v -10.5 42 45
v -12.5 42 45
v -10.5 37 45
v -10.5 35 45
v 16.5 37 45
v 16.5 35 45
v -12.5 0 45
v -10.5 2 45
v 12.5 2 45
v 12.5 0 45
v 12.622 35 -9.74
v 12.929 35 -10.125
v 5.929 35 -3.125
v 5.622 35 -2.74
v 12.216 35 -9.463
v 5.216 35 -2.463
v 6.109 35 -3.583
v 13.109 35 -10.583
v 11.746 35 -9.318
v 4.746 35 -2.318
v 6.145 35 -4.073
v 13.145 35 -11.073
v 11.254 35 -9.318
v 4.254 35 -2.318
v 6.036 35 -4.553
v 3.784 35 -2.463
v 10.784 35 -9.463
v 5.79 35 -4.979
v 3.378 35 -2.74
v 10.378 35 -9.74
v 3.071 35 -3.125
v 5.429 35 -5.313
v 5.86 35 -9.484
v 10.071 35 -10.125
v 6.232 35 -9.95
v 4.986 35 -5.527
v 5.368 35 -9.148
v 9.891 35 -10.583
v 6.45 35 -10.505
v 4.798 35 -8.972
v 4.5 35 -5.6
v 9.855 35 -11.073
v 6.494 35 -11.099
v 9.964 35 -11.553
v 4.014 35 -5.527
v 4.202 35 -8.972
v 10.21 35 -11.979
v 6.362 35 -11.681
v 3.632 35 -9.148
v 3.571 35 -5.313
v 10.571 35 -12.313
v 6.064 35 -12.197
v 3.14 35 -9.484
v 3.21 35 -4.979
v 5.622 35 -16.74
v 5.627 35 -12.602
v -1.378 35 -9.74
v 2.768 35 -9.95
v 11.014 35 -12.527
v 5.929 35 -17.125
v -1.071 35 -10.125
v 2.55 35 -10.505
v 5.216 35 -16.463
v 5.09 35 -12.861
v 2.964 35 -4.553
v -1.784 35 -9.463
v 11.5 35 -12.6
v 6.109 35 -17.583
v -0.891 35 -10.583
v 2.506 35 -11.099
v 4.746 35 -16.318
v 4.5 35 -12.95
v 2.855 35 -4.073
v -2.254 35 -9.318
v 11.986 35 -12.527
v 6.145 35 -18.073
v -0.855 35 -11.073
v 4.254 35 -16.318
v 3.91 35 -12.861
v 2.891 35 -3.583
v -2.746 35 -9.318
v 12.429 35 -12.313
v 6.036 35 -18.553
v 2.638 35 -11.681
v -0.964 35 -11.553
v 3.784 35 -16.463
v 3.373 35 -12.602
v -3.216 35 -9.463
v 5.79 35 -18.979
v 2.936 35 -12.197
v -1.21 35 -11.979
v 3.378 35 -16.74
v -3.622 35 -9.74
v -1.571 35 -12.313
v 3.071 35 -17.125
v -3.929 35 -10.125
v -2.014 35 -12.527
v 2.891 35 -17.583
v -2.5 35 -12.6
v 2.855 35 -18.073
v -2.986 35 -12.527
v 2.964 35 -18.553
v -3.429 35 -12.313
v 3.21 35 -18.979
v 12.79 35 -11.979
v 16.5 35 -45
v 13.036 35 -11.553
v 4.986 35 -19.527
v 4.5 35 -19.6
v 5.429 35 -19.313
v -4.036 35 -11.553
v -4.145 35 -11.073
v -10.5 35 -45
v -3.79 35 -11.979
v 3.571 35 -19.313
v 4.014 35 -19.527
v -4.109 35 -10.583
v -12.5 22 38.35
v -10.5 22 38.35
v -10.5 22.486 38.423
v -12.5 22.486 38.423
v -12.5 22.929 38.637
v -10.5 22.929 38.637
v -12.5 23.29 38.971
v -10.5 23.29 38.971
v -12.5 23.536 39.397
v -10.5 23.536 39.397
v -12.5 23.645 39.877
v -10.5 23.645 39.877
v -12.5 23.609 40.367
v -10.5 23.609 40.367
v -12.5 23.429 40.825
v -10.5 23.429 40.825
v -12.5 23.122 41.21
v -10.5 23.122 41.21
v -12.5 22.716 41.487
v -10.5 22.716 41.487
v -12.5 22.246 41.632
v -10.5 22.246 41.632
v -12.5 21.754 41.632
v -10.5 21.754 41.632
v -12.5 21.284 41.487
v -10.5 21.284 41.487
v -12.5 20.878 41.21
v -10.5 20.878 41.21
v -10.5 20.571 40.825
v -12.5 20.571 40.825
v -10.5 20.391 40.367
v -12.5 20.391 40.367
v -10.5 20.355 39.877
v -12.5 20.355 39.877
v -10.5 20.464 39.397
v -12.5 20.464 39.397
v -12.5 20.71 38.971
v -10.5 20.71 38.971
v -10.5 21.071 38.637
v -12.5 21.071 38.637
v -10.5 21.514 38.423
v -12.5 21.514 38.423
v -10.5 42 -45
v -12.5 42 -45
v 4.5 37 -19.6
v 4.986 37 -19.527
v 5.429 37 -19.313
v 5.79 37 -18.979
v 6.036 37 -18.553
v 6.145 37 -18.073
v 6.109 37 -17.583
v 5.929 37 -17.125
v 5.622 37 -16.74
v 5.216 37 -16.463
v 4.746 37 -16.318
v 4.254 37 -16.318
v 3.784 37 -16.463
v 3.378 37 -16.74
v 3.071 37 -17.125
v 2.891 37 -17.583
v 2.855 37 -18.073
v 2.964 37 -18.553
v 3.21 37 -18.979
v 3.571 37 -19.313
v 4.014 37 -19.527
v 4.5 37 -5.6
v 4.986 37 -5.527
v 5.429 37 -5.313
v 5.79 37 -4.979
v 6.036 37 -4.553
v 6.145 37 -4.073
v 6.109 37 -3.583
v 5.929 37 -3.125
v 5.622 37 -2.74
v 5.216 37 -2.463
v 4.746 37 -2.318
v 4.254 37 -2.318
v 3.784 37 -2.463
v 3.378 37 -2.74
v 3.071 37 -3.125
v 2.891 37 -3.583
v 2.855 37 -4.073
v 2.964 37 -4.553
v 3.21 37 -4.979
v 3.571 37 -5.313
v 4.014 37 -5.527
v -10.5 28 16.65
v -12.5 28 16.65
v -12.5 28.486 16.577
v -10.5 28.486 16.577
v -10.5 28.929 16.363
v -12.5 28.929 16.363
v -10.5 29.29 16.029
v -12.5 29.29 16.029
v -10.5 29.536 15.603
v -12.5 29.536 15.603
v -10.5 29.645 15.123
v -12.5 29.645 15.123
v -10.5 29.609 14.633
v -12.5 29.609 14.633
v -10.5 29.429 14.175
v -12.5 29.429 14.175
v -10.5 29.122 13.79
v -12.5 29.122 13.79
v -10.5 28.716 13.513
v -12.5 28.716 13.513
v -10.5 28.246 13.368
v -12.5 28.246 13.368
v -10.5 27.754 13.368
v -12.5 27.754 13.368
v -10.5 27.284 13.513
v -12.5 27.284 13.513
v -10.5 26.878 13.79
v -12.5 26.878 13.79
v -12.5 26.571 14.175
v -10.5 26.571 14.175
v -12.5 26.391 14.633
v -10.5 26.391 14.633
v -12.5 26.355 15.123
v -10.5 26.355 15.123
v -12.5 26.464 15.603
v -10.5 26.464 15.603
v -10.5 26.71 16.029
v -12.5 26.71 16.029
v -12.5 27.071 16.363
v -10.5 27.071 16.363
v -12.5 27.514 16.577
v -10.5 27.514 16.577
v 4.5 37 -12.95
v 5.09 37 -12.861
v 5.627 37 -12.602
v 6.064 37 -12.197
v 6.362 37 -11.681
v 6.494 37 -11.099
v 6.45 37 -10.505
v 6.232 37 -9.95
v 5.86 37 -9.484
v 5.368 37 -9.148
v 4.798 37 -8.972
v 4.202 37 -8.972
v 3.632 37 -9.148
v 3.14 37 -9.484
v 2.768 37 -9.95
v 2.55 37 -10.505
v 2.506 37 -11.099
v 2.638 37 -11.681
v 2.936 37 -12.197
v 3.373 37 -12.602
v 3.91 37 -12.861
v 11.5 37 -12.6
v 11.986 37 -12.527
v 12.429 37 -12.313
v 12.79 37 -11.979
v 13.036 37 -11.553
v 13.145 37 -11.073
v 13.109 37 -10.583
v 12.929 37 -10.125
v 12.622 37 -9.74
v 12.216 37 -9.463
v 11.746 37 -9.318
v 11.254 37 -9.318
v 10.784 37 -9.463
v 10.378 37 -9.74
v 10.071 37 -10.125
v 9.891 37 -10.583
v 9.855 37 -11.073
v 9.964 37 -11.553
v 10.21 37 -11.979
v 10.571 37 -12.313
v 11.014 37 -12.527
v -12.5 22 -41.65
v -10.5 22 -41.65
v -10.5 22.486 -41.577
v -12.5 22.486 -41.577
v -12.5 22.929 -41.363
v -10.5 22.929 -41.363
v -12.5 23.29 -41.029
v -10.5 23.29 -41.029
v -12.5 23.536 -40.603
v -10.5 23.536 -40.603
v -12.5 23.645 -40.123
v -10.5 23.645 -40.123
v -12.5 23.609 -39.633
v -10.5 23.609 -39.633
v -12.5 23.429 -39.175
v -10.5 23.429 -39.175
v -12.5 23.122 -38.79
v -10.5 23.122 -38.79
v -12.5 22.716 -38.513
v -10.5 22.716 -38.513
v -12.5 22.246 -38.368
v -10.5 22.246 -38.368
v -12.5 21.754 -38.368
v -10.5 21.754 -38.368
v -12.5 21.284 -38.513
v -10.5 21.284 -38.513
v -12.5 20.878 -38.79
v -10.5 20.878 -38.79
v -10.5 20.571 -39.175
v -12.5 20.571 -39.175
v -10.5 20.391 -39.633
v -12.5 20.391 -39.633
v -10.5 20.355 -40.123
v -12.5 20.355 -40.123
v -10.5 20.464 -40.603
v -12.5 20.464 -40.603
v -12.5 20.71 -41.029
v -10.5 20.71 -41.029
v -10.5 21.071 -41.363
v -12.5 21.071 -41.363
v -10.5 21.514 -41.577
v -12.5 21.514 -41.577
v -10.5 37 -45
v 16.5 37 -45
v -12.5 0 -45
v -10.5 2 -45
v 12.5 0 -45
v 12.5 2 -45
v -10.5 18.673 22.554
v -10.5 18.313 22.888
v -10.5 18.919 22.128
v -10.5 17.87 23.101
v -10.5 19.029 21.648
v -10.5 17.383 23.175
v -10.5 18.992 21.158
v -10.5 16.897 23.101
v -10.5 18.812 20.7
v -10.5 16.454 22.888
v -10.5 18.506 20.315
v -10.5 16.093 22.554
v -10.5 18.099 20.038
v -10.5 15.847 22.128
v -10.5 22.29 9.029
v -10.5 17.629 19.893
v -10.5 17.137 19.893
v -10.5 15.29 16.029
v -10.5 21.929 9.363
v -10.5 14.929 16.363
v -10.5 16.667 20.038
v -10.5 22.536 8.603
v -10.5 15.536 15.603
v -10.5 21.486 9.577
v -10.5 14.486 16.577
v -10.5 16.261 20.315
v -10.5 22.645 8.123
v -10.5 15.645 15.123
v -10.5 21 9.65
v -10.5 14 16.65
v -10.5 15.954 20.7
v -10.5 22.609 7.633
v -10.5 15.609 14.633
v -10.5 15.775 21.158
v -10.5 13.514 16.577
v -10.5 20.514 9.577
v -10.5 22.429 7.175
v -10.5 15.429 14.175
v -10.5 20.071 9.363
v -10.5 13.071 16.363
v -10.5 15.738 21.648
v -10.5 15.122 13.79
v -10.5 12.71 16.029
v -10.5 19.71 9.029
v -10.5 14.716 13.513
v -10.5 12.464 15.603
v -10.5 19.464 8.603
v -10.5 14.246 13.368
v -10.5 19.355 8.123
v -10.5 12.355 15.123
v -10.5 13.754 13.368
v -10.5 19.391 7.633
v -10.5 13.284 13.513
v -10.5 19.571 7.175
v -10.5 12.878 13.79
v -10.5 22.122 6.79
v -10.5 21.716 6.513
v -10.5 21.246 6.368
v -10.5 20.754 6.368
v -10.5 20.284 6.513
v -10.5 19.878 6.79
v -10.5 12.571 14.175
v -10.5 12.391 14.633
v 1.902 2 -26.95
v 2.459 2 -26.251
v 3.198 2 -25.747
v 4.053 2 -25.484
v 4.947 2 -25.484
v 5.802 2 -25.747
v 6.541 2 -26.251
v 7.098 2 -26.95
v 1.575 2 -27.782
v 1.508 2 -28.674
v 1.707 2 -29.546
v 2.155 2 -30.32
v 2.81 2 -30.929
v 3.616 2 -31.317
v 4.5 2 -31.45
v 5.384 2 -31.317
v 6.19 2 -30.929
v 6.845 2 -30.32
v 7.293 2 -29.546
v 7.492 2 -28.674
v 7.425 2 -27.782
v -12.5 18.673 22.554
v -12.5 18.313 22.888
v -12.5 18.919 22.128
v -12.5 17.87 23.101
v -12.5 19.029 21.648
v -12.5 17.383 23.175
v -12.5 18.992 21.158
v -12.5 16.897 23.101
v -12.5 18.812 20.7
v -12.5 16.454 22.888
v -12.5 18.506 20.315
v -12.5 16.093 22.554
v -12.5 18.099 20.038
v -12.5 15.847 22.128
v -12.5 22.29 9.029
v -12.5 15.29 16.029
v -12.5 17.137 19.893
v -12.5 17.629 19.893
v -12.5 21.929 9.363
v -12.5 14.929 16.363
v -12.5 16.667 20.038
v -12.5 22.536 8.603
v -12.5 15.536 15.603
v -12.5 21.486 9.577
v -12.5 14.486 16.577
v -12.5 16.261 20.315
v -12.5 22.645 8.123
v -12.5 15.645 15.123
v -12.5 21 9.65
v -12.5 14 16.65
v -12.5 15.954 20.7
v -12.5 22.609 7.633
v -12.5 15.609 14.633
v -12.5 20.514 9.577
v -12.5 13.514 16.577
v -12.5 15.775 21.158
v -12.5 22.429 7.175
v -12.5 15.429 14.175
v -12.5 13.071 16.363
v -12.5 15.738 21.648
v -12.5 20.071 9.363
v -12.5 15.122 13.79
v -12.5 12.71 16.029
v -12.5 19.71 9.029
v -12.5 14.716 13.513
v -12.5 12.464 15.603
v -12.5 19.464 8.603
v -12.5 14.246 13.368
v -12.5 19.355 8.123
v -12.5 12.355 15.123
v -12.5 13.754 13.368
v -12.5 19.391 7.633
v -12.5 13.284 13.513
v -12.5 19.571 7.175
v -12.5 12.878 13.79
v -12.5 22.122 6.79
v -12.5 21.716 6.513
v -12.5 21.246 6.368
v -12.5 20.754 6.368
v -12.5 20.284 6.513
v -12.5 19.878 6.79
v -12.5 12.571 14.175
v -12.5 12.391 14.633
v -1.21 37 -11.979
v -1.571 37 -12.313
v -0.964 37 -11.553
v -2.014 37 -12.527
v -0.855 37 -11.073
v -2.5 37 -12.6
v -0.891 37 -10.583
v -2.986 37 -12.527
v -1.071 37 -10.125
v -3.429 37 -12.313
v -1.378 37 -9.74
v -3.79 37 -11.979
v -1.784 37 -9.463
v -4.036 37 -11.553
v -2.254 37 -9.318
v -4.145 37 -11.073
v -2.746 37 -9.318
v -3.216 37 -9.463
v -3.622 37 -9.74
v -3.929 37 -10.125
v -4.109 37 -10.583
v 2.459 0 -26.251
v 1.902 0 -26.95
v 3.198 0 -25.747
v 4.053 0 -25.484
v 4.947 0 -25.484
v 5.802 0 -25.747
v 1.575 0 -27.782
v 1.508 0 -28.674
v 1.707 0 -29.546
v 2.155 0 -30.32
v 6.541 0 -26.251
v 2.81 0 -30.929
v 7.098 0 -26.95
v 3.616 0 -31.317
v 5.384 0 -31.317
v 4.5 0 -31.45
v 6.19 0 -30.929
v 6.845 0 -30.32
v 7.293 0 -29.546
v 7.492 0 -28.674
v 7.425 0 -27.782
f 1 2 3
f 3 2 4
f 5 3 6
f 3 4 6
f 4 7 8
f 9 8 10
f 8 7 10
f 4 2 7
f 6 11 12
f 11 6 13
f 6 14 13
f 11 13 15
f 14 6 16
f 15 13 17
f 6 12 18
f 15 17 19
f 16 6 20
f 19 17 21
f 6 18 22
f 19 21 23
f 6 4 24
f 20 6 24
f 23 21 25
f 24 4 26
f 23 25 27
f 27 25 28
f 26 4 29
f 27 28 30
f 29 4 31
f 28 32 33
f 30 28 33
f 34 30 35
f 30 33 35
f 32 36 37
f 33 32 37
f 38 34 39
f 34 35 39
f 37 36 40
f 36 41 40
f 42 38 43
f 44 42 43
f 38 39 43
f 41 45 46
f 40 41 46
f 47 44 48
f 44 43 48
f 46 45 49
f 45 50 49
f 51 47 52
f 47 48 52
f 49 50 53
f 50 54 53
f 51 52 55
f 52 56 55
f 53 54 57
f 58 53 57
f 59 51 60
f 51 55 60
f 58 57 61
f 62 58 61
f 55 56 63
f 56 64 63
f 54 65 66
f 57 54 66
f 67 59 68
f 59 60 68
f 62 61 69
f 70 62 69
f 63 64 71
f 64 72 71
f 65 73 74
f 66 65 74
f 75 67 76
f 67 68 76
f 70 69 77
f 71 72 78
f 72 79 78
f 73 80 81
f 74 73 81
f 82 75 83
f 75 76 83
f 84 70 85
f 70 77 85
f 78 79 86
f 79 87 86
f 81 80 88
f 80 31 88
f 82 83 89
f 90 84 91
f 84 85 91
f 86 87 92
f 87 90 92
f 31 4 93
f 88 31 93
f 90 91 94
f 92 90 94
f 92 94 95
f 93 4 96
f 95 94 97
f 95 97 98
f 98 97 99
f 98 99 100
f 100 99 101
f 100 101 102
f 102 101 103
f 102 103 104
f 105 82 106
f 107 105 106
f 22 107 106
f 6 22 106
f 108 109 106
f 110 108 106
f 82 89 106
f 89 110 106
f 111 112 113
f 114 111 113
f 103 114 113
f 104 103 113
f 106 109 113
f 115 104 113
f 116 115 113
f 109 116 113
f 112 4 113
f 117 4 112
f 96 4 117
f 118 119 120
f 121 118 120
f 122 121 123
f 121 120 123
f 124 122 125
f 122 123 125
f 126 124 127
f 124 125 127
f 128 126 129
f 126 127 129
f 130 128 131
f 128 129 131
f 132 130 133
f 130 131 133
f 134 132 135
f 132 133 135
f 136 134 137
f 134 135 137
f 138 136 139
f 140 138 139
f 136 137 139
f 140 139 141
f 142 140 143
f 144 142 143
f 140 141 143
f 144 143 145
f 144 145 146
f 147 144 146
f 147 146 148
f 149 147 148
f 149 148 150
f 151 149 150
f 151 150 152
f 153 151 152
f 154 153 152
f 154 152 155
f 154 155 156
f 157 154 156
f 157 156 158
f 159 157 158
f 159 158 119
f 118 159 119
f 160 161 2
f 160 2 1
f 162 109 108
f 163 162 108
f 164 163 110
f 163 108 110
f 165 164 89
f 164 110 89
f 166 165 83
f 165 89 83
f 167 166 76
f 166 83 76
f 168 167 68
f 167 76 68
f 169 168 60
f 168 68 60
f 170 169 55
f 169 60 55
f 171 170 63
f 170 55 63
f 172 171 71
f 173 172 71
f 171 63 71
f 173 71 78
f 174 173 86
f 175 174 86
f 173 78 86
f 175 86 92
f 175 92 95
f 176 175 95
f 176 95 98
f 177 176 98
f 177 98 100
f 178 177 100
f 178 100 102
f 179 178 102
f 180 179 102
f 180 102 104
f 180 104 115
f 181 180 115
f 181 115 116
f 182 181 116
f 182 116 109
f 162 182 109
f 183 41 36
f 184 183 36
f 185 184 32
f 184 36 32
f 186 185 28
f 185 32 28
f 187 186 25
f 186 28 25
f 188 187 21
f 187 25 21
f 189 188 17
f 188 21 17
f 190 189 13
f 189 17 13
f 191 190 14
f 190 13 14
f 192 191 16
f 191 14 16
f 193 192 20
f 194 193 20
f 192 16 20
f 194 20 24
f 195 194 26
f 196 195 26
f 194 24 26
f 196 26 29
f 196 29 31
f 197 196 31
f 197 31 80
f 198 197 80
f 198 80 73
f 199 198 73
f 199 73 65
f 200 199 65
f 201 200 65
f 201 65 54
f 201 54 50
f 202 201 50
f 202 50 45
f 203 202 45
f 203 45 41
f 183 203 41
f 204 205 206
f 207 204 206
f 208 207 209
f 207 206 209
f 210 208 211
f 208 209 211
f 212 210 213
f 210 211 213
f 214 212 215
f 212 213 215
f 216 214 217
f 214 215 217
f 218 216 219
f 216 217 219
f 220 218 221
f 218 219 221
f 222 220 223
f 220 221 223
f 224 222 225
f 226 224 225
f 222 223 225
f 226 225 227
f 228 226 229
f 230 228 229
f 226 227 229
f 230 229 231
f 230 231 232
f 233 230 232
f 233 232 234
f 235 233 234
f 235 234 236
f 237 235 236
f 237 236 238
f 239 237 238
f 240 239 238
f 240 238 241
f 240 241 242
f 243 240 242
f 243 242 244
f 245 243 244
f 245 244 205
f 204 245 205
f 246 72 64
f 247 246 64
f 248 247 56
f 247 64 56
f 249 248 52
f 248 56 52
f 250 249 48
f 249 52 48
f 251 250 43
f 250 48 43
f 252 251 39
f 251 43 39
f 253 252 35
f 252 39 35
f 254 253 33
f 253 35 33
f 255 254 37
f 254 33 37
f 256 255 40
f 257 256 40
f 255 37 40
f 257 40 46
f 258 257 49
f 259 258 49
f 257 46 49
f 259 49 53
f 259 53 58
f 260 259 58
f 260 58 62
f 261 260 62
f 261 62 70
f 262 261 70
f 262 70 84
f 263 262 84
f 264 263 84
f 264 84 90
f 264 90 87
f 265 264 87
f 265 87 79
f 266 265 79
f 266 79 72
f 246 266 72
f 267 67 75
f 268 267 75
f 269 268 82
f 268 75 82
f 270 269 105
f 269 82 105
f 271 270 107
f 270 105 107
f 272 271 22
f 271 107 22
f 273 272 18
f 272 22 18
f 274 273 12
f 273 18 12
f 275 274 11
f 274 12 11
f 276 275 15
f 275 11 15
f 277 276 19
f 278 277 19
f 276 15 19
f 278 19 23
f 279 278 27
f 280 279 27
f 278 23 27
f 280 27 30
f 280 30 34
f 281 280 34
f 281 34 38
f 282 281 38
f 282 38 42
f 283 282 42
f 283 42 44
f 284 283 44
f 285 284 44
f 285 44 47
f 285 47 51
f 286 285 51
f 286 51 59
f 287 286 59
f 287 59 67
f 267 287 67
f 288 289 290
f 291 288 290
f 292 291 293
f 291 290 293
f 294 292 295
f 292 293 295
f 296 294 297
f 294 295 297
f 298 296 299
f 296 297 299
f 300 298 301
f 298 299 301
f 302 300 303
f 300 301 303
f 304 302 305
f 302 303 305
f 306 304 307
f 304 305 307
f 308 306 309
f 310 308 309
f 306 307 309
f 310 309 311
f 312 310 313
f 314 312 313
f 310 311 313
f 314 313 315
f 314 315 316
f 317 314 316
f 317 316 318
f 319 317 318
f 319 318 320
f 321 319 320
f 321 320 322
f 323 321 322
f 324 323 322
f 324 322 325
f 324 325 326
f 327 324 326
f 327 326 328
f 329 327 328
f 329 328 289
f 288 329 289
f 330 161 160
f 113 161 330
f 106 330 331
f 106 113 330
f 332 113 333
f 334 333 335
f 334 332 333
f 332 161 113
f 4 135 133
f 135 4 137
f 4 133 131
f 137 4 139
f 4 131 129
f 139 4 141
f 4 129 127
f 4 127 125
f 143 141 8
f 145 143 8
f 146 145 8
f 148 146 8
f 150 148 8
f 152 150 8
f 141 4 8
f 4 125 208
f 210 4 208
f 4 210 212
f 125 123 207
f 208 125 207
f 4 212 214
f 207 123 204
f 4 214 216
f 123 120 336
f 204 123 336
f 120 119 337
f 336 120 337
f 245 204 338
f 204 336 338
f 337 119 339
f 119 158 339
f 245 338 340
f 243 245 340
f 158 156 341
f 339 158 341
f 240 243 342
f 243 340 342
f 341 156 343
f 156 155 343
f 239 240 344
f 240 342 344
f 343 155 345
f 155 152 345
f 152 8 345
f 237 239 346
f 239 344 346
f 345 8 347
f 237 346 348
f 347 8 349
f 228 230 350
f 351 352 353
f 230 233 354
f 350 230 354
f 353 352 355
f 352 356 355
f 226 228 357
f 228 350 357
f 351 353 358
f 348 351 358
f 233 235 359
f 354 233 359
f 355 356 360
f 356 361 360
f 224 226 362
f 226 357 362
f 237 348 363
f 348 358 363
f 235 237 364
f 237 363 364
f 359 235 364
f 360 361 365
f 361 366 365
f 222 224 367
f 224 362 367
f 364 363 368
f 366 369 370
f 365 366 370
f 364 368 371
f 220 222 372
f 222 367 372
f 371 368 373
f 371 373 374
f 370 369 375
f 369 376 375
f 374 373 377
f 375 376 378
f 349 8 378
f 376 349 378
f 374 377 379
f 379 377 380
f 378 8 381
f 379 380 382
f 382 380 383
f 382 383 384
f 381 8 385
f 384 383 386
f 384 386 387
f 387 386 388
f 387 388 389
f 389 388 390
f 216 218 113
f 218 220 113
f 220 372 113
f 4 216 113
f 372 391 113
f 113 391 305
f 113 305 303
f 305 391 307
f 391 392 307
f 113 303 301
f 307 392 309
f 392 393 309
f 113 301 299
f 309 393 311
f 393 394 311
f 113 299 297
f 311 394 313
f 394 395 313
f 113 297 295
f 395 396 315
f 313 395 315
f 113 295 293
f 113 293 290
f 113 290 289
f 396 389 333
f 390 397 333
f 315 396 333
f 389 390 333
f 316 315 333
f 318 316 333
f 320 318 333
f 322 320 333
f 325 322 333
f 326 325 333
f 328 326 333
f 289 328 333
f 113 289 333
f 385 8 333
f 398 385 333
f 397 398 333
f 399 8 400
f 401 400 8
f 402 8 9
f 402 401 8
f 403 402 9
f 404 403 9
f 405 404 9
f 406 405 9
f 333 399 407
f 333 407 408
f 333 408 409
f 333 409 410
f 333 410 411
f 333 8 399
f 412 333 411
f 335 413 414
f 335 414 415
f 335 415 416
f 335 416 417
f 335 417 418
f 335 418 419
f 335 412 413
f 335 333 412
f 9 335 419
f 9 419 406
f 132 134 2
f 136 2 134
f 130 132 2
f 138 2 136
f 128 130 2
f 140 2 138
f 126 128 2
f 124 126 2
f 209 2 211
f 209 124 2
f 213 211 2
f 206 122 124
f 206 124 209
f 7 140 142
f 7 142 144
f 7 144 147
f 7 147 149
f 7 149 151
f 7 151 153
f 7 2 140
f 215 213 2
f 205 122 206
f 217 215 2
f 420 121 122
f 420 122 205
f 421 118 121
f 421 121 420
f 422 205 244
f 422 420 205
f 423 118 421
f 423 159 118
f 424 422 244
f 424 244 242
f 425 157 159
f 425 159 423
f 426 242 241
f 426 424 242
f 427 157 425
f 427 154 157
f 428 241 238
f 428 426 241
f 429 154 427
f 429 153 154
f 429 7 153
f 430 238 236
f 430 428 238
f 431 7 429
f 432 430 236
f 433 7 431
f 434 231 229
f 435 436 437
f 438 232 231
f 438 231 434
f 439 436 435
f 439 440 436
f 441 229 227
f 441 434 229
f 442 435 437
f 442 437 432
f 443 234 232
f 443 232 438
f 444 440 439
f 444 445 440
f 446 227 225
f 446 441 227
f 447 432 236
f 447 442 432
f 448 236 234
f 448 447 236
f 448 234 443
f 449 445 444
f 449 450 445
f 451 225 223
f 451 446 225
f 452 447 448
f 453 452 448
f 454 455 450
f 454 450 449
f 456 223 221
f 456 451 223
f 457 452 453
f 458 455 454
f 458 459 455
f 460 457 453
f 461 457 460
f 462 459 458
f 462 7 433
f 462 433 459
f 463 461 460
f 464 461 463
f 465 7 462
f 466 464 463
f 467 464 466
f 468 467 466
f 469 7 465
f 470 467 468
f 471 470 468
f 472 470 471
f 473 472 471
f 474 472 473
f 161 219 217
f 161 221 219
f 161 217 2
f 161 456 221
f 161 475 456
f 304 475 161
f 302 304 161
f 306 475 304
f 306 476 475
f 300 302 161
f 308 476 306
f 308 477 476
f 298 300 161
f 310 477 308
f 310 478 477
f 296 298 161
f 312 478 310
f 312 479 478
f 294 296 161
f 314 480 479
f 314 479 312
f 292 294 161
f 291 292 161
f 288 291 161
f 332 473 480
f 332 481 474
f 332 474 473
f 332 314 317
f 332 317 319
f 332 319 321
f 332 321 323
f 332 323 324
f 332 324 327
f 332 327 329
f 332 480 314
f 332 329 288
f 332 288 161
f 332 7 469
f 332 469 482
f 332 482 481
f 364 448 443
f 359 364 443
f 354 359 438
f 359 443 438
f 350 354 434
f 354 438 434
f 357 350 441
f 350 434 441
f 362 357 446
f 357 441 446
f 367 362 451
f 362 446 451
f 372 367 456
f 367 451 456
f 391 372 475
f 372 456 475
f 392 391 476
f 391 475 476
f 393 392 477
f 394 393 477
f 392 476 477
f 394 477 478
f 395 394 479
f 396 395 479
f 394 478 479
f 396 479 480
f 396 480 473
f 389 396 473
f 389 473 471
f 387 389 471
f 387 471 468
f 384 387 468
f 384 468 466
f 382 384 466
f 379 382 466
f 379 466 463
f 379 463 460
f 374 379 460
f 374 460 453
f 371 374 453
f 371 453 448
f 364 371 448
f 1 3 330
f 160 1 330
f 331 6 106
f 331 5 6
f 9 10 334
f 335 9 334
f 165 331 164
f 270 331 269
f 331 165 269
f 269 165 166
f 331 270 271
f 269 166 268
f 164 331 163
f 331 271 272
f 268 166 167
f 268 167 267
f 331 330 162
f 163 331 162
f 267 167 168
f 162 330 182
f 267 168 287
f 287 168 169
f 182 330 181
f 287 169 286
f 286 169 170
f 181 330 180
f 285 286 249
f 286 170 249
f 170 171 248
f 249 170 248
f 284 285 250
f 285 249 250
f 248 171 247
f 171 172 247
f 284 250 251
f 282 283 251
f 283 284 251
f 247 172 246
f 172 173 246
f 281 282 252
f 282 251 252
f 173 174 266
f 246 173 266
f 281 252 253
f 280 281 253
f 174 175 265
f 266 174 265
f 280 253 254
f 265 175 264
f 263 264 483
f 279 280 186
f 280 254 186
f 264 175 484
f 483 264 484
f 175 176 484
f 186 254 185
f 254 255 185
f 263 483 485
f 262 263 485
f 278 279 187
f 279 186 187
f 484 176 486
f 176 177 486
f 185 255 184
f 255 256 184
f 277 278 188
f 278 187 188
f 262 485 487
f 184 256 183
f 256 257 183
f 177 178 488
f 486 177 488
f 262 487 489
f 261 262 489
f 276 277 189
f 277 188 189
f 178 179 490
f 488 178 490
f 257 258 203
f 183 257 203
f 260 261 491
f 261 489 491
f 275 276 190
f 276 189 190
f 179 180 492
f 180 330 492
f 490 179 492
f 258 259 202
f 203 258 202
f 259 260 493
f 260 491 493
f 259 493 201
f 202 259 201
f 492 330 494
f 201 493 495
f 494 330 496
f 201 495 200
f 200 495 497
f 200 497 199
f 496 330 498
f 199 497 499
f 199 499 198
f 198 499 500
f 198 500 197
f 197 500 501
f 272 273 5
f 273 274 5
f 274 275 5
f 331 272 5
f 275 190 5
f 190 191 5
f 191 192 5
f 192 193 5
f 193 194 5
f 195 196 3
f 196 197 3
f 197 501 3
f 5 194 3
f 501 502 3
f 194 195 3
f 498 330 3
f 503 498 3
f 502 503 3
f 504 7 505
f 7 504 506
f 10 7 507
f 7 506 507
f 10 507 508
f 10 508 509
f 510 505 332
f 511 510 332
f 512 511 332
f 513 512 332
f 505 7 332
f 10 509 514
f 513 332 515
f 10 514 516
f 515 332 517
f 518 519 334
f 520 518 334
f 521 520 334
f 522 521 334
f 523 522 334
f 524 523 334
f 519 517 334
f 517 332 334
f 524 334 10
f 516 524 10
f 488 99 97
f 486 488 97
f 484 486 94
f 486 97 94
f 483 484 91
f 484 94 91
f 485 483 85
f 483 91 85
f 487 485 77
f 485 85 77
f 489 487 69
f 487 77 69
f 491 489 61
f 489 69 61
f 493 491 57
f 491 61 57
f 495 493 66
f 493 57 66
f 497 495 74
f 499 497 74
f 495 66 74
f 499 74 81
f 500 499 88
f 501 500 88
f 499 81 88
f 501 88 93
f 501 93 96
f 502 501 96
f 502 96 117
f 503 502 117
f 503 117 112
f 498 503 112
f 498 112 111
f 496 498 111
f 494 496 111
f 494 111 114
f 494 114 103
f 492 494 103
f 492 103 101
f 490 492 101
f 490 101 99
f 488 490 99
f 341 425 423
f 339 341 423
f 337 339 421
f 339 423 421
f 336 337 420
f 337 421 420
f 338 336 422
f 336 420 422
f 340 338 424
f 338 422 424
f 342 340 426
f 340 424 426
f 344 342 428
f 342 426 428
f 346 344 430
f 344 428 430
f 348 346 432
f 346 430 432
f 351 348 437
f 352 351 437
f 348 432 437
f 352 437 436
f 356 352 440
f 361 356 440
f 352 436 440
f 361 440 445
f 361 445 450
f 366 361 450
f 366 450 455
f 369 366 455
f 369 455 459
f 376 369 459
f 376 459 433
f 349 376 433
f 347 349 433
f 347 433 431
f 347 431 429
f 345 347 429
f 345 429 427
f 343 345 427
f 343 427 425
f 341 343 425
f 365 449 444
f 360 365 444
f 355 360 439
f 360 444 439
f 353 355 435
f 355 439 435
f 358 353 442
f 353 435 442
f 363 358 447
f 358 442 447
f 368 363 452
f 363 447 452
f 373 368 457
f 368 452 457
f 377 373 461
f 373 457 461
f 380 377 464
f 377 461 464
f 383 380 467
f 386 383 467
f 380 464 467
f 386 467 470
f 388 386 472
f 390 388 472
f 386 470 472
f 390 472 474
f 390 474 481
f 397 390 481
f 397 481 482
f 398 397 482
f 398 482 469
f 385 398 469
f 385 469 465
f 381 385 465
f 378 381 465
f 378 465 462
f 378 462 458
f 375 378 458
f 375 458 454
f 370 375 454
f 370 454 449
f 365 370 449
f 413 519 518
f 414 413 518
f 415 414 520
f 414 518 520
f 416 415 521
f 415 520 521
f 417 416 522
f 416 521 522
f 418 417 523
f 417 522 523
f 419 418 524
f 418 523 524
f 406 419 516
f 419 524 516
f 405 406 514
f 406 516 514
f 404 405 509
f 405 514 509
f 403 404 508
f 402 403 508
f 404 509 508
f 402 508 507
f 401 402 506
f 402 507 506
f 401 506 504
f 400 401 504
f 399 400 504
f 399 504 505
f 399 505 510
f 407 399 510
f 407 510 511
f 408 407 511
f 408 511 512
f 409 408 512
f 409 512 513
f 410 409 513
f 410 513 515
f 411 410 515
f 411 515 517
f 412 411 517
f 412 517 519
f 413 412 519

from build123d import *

# Parameters (mm, degrees)
SKETCH_1_W          = 25
SKETCH_1_H          = 90
EXTRUDE_1_DEPTH     = 2
SKETCH_3_W          = 2
SKETCH_3_H          = 90
EXTRUDE_2_DEPTH     = 40
SKETCH_6_R          = 1.65
CUT_EXTRUDE_3_DEPTH = 10
SKETCH_7_R          = 3
CUT_EXTRUDE_4_DEPTH = 10
SKETCH_8_R          = 1.65
CUT_EXTRUDE_5_DEPTH = 10
EXTRUDE_3_DEPTH     = 27
SKETCH_10_R         = 1.65
SKETCH_10_R_2       = 2
CUT_EXTRUDE_7_DEPTH = 6


with BuildPart() as part:
    # 草图1 → 凸台-拉伸1 (new body)
    with BuildSketch(Plane(origin=(0, 0, 0), x_dir=(1, 0, 0), z_dir=(0, 1, 0))):
        Rectangle(SKETCH_1_W, SKETCH_1_H)
    extrude(amount=EXTRUDE_1_DEPTH)

    # 草图3 → 凸台-拉伸2 (add)
    with BuildSketch(Plane(origin=(0, 2, 0), x_dir=(1, 0, 0), z_dir=(0, 1, 0))):
        with Locations((-11.5, 0)):
            Rectangle(SKETCH_3_W, SKETCH_3_H)
    extrude(amount=EXTRUDE_2_DEPTH)

    # 草图6 → 切除-拉伸3 (cut)
    with BuildSketch(Plane.ZY.offset(12.5)):
        with Locations((8, 21)):
            Circle(SKETCH_6_R)
        with Locations((21.524795588, 17.383384964)):
            Circle(SKETCH_6_R)
        with Locations((15, 14)):
            Circle(SKETCH_6_R)
        with Locations((15, 28)):
            Circle(SKETCH_6_R)
    extrude(amount=-CUT_EXTRUDE_3_DEPTH, mode=Mode.SUBTRACT)

    # 草图7 → 切除-拉伸4 (cut)
    with BuildSketch(Plane(origin=(0, 0, 0), x_dir=(-1, 0, 0), z_dir=(0, -1, 0))):
        with Locations(Location((-4.5, 28.45, 0), (0, 0, 90))):
            Circle(SKETCH_7_R)
    extrude(amount=-CUT_EXTRUDE_4_DEPTH, mode=Mode.SUBTRACT)

    # 草图8 → 切除-拉伸5 (cut)
    with BuildSketch(Plane(origin=(-10.5, 0, 0), x_dir=(0, 0, -1), z_dir=(1, 0, 0))):
        with Locations((-40, 22)):
            Circle(SKETCH_8_R)
        with Locations((40, 22)):
            Circle(SKETCH_8_R)
    extrude(amount=-CUT_EXTRUDE_5_DEPTH, mode=Mode.SUBTRACT)

    # 草图9 → 凸台-拉伸3 (add)
    with BuildSketch(Plane(origin=(-10.5, 0, 0), x_dir=(0, 0, -1), z_dir=(1, 0, 0))):
        Polygon((-45, 35), (0, 35), (45, 35), (45, 37), (-45, 37), align=None)
    extrude(amount=EXTRUDE_3_DEPTH)

    # 草图10 → 切除-拉伸7 (cut)
    with BuildSketch(Plane.XZ.offset(-35)):
        with Locations(Location((4.5, -17.95, 0), (0, 0, 270))):
            Circle(SKETCH_10_R)
        with Locations(Location((11.5, -10.95, 0), (0, 0, 270))):
            Circle(SKETCH_10_R)
        with Locations(Location((4.5, -10.95, 0), (0, 0, 270))):
            Circle(SKETCH_10_R_2)
        with Locations(Location((-2.5, -10.95, 0), (0, 0, 270))):
            Circle(SKETCH_10_R)
        with Locations(Location((4.5, -3.95, 0), (0, 0, 270))):
            Circle(SKETCH_10_R)
    extrude(amount=-CUT_EXTRUDE_7_DEPTH, mode=Mode.SUBTRACT)


solid = part.part
